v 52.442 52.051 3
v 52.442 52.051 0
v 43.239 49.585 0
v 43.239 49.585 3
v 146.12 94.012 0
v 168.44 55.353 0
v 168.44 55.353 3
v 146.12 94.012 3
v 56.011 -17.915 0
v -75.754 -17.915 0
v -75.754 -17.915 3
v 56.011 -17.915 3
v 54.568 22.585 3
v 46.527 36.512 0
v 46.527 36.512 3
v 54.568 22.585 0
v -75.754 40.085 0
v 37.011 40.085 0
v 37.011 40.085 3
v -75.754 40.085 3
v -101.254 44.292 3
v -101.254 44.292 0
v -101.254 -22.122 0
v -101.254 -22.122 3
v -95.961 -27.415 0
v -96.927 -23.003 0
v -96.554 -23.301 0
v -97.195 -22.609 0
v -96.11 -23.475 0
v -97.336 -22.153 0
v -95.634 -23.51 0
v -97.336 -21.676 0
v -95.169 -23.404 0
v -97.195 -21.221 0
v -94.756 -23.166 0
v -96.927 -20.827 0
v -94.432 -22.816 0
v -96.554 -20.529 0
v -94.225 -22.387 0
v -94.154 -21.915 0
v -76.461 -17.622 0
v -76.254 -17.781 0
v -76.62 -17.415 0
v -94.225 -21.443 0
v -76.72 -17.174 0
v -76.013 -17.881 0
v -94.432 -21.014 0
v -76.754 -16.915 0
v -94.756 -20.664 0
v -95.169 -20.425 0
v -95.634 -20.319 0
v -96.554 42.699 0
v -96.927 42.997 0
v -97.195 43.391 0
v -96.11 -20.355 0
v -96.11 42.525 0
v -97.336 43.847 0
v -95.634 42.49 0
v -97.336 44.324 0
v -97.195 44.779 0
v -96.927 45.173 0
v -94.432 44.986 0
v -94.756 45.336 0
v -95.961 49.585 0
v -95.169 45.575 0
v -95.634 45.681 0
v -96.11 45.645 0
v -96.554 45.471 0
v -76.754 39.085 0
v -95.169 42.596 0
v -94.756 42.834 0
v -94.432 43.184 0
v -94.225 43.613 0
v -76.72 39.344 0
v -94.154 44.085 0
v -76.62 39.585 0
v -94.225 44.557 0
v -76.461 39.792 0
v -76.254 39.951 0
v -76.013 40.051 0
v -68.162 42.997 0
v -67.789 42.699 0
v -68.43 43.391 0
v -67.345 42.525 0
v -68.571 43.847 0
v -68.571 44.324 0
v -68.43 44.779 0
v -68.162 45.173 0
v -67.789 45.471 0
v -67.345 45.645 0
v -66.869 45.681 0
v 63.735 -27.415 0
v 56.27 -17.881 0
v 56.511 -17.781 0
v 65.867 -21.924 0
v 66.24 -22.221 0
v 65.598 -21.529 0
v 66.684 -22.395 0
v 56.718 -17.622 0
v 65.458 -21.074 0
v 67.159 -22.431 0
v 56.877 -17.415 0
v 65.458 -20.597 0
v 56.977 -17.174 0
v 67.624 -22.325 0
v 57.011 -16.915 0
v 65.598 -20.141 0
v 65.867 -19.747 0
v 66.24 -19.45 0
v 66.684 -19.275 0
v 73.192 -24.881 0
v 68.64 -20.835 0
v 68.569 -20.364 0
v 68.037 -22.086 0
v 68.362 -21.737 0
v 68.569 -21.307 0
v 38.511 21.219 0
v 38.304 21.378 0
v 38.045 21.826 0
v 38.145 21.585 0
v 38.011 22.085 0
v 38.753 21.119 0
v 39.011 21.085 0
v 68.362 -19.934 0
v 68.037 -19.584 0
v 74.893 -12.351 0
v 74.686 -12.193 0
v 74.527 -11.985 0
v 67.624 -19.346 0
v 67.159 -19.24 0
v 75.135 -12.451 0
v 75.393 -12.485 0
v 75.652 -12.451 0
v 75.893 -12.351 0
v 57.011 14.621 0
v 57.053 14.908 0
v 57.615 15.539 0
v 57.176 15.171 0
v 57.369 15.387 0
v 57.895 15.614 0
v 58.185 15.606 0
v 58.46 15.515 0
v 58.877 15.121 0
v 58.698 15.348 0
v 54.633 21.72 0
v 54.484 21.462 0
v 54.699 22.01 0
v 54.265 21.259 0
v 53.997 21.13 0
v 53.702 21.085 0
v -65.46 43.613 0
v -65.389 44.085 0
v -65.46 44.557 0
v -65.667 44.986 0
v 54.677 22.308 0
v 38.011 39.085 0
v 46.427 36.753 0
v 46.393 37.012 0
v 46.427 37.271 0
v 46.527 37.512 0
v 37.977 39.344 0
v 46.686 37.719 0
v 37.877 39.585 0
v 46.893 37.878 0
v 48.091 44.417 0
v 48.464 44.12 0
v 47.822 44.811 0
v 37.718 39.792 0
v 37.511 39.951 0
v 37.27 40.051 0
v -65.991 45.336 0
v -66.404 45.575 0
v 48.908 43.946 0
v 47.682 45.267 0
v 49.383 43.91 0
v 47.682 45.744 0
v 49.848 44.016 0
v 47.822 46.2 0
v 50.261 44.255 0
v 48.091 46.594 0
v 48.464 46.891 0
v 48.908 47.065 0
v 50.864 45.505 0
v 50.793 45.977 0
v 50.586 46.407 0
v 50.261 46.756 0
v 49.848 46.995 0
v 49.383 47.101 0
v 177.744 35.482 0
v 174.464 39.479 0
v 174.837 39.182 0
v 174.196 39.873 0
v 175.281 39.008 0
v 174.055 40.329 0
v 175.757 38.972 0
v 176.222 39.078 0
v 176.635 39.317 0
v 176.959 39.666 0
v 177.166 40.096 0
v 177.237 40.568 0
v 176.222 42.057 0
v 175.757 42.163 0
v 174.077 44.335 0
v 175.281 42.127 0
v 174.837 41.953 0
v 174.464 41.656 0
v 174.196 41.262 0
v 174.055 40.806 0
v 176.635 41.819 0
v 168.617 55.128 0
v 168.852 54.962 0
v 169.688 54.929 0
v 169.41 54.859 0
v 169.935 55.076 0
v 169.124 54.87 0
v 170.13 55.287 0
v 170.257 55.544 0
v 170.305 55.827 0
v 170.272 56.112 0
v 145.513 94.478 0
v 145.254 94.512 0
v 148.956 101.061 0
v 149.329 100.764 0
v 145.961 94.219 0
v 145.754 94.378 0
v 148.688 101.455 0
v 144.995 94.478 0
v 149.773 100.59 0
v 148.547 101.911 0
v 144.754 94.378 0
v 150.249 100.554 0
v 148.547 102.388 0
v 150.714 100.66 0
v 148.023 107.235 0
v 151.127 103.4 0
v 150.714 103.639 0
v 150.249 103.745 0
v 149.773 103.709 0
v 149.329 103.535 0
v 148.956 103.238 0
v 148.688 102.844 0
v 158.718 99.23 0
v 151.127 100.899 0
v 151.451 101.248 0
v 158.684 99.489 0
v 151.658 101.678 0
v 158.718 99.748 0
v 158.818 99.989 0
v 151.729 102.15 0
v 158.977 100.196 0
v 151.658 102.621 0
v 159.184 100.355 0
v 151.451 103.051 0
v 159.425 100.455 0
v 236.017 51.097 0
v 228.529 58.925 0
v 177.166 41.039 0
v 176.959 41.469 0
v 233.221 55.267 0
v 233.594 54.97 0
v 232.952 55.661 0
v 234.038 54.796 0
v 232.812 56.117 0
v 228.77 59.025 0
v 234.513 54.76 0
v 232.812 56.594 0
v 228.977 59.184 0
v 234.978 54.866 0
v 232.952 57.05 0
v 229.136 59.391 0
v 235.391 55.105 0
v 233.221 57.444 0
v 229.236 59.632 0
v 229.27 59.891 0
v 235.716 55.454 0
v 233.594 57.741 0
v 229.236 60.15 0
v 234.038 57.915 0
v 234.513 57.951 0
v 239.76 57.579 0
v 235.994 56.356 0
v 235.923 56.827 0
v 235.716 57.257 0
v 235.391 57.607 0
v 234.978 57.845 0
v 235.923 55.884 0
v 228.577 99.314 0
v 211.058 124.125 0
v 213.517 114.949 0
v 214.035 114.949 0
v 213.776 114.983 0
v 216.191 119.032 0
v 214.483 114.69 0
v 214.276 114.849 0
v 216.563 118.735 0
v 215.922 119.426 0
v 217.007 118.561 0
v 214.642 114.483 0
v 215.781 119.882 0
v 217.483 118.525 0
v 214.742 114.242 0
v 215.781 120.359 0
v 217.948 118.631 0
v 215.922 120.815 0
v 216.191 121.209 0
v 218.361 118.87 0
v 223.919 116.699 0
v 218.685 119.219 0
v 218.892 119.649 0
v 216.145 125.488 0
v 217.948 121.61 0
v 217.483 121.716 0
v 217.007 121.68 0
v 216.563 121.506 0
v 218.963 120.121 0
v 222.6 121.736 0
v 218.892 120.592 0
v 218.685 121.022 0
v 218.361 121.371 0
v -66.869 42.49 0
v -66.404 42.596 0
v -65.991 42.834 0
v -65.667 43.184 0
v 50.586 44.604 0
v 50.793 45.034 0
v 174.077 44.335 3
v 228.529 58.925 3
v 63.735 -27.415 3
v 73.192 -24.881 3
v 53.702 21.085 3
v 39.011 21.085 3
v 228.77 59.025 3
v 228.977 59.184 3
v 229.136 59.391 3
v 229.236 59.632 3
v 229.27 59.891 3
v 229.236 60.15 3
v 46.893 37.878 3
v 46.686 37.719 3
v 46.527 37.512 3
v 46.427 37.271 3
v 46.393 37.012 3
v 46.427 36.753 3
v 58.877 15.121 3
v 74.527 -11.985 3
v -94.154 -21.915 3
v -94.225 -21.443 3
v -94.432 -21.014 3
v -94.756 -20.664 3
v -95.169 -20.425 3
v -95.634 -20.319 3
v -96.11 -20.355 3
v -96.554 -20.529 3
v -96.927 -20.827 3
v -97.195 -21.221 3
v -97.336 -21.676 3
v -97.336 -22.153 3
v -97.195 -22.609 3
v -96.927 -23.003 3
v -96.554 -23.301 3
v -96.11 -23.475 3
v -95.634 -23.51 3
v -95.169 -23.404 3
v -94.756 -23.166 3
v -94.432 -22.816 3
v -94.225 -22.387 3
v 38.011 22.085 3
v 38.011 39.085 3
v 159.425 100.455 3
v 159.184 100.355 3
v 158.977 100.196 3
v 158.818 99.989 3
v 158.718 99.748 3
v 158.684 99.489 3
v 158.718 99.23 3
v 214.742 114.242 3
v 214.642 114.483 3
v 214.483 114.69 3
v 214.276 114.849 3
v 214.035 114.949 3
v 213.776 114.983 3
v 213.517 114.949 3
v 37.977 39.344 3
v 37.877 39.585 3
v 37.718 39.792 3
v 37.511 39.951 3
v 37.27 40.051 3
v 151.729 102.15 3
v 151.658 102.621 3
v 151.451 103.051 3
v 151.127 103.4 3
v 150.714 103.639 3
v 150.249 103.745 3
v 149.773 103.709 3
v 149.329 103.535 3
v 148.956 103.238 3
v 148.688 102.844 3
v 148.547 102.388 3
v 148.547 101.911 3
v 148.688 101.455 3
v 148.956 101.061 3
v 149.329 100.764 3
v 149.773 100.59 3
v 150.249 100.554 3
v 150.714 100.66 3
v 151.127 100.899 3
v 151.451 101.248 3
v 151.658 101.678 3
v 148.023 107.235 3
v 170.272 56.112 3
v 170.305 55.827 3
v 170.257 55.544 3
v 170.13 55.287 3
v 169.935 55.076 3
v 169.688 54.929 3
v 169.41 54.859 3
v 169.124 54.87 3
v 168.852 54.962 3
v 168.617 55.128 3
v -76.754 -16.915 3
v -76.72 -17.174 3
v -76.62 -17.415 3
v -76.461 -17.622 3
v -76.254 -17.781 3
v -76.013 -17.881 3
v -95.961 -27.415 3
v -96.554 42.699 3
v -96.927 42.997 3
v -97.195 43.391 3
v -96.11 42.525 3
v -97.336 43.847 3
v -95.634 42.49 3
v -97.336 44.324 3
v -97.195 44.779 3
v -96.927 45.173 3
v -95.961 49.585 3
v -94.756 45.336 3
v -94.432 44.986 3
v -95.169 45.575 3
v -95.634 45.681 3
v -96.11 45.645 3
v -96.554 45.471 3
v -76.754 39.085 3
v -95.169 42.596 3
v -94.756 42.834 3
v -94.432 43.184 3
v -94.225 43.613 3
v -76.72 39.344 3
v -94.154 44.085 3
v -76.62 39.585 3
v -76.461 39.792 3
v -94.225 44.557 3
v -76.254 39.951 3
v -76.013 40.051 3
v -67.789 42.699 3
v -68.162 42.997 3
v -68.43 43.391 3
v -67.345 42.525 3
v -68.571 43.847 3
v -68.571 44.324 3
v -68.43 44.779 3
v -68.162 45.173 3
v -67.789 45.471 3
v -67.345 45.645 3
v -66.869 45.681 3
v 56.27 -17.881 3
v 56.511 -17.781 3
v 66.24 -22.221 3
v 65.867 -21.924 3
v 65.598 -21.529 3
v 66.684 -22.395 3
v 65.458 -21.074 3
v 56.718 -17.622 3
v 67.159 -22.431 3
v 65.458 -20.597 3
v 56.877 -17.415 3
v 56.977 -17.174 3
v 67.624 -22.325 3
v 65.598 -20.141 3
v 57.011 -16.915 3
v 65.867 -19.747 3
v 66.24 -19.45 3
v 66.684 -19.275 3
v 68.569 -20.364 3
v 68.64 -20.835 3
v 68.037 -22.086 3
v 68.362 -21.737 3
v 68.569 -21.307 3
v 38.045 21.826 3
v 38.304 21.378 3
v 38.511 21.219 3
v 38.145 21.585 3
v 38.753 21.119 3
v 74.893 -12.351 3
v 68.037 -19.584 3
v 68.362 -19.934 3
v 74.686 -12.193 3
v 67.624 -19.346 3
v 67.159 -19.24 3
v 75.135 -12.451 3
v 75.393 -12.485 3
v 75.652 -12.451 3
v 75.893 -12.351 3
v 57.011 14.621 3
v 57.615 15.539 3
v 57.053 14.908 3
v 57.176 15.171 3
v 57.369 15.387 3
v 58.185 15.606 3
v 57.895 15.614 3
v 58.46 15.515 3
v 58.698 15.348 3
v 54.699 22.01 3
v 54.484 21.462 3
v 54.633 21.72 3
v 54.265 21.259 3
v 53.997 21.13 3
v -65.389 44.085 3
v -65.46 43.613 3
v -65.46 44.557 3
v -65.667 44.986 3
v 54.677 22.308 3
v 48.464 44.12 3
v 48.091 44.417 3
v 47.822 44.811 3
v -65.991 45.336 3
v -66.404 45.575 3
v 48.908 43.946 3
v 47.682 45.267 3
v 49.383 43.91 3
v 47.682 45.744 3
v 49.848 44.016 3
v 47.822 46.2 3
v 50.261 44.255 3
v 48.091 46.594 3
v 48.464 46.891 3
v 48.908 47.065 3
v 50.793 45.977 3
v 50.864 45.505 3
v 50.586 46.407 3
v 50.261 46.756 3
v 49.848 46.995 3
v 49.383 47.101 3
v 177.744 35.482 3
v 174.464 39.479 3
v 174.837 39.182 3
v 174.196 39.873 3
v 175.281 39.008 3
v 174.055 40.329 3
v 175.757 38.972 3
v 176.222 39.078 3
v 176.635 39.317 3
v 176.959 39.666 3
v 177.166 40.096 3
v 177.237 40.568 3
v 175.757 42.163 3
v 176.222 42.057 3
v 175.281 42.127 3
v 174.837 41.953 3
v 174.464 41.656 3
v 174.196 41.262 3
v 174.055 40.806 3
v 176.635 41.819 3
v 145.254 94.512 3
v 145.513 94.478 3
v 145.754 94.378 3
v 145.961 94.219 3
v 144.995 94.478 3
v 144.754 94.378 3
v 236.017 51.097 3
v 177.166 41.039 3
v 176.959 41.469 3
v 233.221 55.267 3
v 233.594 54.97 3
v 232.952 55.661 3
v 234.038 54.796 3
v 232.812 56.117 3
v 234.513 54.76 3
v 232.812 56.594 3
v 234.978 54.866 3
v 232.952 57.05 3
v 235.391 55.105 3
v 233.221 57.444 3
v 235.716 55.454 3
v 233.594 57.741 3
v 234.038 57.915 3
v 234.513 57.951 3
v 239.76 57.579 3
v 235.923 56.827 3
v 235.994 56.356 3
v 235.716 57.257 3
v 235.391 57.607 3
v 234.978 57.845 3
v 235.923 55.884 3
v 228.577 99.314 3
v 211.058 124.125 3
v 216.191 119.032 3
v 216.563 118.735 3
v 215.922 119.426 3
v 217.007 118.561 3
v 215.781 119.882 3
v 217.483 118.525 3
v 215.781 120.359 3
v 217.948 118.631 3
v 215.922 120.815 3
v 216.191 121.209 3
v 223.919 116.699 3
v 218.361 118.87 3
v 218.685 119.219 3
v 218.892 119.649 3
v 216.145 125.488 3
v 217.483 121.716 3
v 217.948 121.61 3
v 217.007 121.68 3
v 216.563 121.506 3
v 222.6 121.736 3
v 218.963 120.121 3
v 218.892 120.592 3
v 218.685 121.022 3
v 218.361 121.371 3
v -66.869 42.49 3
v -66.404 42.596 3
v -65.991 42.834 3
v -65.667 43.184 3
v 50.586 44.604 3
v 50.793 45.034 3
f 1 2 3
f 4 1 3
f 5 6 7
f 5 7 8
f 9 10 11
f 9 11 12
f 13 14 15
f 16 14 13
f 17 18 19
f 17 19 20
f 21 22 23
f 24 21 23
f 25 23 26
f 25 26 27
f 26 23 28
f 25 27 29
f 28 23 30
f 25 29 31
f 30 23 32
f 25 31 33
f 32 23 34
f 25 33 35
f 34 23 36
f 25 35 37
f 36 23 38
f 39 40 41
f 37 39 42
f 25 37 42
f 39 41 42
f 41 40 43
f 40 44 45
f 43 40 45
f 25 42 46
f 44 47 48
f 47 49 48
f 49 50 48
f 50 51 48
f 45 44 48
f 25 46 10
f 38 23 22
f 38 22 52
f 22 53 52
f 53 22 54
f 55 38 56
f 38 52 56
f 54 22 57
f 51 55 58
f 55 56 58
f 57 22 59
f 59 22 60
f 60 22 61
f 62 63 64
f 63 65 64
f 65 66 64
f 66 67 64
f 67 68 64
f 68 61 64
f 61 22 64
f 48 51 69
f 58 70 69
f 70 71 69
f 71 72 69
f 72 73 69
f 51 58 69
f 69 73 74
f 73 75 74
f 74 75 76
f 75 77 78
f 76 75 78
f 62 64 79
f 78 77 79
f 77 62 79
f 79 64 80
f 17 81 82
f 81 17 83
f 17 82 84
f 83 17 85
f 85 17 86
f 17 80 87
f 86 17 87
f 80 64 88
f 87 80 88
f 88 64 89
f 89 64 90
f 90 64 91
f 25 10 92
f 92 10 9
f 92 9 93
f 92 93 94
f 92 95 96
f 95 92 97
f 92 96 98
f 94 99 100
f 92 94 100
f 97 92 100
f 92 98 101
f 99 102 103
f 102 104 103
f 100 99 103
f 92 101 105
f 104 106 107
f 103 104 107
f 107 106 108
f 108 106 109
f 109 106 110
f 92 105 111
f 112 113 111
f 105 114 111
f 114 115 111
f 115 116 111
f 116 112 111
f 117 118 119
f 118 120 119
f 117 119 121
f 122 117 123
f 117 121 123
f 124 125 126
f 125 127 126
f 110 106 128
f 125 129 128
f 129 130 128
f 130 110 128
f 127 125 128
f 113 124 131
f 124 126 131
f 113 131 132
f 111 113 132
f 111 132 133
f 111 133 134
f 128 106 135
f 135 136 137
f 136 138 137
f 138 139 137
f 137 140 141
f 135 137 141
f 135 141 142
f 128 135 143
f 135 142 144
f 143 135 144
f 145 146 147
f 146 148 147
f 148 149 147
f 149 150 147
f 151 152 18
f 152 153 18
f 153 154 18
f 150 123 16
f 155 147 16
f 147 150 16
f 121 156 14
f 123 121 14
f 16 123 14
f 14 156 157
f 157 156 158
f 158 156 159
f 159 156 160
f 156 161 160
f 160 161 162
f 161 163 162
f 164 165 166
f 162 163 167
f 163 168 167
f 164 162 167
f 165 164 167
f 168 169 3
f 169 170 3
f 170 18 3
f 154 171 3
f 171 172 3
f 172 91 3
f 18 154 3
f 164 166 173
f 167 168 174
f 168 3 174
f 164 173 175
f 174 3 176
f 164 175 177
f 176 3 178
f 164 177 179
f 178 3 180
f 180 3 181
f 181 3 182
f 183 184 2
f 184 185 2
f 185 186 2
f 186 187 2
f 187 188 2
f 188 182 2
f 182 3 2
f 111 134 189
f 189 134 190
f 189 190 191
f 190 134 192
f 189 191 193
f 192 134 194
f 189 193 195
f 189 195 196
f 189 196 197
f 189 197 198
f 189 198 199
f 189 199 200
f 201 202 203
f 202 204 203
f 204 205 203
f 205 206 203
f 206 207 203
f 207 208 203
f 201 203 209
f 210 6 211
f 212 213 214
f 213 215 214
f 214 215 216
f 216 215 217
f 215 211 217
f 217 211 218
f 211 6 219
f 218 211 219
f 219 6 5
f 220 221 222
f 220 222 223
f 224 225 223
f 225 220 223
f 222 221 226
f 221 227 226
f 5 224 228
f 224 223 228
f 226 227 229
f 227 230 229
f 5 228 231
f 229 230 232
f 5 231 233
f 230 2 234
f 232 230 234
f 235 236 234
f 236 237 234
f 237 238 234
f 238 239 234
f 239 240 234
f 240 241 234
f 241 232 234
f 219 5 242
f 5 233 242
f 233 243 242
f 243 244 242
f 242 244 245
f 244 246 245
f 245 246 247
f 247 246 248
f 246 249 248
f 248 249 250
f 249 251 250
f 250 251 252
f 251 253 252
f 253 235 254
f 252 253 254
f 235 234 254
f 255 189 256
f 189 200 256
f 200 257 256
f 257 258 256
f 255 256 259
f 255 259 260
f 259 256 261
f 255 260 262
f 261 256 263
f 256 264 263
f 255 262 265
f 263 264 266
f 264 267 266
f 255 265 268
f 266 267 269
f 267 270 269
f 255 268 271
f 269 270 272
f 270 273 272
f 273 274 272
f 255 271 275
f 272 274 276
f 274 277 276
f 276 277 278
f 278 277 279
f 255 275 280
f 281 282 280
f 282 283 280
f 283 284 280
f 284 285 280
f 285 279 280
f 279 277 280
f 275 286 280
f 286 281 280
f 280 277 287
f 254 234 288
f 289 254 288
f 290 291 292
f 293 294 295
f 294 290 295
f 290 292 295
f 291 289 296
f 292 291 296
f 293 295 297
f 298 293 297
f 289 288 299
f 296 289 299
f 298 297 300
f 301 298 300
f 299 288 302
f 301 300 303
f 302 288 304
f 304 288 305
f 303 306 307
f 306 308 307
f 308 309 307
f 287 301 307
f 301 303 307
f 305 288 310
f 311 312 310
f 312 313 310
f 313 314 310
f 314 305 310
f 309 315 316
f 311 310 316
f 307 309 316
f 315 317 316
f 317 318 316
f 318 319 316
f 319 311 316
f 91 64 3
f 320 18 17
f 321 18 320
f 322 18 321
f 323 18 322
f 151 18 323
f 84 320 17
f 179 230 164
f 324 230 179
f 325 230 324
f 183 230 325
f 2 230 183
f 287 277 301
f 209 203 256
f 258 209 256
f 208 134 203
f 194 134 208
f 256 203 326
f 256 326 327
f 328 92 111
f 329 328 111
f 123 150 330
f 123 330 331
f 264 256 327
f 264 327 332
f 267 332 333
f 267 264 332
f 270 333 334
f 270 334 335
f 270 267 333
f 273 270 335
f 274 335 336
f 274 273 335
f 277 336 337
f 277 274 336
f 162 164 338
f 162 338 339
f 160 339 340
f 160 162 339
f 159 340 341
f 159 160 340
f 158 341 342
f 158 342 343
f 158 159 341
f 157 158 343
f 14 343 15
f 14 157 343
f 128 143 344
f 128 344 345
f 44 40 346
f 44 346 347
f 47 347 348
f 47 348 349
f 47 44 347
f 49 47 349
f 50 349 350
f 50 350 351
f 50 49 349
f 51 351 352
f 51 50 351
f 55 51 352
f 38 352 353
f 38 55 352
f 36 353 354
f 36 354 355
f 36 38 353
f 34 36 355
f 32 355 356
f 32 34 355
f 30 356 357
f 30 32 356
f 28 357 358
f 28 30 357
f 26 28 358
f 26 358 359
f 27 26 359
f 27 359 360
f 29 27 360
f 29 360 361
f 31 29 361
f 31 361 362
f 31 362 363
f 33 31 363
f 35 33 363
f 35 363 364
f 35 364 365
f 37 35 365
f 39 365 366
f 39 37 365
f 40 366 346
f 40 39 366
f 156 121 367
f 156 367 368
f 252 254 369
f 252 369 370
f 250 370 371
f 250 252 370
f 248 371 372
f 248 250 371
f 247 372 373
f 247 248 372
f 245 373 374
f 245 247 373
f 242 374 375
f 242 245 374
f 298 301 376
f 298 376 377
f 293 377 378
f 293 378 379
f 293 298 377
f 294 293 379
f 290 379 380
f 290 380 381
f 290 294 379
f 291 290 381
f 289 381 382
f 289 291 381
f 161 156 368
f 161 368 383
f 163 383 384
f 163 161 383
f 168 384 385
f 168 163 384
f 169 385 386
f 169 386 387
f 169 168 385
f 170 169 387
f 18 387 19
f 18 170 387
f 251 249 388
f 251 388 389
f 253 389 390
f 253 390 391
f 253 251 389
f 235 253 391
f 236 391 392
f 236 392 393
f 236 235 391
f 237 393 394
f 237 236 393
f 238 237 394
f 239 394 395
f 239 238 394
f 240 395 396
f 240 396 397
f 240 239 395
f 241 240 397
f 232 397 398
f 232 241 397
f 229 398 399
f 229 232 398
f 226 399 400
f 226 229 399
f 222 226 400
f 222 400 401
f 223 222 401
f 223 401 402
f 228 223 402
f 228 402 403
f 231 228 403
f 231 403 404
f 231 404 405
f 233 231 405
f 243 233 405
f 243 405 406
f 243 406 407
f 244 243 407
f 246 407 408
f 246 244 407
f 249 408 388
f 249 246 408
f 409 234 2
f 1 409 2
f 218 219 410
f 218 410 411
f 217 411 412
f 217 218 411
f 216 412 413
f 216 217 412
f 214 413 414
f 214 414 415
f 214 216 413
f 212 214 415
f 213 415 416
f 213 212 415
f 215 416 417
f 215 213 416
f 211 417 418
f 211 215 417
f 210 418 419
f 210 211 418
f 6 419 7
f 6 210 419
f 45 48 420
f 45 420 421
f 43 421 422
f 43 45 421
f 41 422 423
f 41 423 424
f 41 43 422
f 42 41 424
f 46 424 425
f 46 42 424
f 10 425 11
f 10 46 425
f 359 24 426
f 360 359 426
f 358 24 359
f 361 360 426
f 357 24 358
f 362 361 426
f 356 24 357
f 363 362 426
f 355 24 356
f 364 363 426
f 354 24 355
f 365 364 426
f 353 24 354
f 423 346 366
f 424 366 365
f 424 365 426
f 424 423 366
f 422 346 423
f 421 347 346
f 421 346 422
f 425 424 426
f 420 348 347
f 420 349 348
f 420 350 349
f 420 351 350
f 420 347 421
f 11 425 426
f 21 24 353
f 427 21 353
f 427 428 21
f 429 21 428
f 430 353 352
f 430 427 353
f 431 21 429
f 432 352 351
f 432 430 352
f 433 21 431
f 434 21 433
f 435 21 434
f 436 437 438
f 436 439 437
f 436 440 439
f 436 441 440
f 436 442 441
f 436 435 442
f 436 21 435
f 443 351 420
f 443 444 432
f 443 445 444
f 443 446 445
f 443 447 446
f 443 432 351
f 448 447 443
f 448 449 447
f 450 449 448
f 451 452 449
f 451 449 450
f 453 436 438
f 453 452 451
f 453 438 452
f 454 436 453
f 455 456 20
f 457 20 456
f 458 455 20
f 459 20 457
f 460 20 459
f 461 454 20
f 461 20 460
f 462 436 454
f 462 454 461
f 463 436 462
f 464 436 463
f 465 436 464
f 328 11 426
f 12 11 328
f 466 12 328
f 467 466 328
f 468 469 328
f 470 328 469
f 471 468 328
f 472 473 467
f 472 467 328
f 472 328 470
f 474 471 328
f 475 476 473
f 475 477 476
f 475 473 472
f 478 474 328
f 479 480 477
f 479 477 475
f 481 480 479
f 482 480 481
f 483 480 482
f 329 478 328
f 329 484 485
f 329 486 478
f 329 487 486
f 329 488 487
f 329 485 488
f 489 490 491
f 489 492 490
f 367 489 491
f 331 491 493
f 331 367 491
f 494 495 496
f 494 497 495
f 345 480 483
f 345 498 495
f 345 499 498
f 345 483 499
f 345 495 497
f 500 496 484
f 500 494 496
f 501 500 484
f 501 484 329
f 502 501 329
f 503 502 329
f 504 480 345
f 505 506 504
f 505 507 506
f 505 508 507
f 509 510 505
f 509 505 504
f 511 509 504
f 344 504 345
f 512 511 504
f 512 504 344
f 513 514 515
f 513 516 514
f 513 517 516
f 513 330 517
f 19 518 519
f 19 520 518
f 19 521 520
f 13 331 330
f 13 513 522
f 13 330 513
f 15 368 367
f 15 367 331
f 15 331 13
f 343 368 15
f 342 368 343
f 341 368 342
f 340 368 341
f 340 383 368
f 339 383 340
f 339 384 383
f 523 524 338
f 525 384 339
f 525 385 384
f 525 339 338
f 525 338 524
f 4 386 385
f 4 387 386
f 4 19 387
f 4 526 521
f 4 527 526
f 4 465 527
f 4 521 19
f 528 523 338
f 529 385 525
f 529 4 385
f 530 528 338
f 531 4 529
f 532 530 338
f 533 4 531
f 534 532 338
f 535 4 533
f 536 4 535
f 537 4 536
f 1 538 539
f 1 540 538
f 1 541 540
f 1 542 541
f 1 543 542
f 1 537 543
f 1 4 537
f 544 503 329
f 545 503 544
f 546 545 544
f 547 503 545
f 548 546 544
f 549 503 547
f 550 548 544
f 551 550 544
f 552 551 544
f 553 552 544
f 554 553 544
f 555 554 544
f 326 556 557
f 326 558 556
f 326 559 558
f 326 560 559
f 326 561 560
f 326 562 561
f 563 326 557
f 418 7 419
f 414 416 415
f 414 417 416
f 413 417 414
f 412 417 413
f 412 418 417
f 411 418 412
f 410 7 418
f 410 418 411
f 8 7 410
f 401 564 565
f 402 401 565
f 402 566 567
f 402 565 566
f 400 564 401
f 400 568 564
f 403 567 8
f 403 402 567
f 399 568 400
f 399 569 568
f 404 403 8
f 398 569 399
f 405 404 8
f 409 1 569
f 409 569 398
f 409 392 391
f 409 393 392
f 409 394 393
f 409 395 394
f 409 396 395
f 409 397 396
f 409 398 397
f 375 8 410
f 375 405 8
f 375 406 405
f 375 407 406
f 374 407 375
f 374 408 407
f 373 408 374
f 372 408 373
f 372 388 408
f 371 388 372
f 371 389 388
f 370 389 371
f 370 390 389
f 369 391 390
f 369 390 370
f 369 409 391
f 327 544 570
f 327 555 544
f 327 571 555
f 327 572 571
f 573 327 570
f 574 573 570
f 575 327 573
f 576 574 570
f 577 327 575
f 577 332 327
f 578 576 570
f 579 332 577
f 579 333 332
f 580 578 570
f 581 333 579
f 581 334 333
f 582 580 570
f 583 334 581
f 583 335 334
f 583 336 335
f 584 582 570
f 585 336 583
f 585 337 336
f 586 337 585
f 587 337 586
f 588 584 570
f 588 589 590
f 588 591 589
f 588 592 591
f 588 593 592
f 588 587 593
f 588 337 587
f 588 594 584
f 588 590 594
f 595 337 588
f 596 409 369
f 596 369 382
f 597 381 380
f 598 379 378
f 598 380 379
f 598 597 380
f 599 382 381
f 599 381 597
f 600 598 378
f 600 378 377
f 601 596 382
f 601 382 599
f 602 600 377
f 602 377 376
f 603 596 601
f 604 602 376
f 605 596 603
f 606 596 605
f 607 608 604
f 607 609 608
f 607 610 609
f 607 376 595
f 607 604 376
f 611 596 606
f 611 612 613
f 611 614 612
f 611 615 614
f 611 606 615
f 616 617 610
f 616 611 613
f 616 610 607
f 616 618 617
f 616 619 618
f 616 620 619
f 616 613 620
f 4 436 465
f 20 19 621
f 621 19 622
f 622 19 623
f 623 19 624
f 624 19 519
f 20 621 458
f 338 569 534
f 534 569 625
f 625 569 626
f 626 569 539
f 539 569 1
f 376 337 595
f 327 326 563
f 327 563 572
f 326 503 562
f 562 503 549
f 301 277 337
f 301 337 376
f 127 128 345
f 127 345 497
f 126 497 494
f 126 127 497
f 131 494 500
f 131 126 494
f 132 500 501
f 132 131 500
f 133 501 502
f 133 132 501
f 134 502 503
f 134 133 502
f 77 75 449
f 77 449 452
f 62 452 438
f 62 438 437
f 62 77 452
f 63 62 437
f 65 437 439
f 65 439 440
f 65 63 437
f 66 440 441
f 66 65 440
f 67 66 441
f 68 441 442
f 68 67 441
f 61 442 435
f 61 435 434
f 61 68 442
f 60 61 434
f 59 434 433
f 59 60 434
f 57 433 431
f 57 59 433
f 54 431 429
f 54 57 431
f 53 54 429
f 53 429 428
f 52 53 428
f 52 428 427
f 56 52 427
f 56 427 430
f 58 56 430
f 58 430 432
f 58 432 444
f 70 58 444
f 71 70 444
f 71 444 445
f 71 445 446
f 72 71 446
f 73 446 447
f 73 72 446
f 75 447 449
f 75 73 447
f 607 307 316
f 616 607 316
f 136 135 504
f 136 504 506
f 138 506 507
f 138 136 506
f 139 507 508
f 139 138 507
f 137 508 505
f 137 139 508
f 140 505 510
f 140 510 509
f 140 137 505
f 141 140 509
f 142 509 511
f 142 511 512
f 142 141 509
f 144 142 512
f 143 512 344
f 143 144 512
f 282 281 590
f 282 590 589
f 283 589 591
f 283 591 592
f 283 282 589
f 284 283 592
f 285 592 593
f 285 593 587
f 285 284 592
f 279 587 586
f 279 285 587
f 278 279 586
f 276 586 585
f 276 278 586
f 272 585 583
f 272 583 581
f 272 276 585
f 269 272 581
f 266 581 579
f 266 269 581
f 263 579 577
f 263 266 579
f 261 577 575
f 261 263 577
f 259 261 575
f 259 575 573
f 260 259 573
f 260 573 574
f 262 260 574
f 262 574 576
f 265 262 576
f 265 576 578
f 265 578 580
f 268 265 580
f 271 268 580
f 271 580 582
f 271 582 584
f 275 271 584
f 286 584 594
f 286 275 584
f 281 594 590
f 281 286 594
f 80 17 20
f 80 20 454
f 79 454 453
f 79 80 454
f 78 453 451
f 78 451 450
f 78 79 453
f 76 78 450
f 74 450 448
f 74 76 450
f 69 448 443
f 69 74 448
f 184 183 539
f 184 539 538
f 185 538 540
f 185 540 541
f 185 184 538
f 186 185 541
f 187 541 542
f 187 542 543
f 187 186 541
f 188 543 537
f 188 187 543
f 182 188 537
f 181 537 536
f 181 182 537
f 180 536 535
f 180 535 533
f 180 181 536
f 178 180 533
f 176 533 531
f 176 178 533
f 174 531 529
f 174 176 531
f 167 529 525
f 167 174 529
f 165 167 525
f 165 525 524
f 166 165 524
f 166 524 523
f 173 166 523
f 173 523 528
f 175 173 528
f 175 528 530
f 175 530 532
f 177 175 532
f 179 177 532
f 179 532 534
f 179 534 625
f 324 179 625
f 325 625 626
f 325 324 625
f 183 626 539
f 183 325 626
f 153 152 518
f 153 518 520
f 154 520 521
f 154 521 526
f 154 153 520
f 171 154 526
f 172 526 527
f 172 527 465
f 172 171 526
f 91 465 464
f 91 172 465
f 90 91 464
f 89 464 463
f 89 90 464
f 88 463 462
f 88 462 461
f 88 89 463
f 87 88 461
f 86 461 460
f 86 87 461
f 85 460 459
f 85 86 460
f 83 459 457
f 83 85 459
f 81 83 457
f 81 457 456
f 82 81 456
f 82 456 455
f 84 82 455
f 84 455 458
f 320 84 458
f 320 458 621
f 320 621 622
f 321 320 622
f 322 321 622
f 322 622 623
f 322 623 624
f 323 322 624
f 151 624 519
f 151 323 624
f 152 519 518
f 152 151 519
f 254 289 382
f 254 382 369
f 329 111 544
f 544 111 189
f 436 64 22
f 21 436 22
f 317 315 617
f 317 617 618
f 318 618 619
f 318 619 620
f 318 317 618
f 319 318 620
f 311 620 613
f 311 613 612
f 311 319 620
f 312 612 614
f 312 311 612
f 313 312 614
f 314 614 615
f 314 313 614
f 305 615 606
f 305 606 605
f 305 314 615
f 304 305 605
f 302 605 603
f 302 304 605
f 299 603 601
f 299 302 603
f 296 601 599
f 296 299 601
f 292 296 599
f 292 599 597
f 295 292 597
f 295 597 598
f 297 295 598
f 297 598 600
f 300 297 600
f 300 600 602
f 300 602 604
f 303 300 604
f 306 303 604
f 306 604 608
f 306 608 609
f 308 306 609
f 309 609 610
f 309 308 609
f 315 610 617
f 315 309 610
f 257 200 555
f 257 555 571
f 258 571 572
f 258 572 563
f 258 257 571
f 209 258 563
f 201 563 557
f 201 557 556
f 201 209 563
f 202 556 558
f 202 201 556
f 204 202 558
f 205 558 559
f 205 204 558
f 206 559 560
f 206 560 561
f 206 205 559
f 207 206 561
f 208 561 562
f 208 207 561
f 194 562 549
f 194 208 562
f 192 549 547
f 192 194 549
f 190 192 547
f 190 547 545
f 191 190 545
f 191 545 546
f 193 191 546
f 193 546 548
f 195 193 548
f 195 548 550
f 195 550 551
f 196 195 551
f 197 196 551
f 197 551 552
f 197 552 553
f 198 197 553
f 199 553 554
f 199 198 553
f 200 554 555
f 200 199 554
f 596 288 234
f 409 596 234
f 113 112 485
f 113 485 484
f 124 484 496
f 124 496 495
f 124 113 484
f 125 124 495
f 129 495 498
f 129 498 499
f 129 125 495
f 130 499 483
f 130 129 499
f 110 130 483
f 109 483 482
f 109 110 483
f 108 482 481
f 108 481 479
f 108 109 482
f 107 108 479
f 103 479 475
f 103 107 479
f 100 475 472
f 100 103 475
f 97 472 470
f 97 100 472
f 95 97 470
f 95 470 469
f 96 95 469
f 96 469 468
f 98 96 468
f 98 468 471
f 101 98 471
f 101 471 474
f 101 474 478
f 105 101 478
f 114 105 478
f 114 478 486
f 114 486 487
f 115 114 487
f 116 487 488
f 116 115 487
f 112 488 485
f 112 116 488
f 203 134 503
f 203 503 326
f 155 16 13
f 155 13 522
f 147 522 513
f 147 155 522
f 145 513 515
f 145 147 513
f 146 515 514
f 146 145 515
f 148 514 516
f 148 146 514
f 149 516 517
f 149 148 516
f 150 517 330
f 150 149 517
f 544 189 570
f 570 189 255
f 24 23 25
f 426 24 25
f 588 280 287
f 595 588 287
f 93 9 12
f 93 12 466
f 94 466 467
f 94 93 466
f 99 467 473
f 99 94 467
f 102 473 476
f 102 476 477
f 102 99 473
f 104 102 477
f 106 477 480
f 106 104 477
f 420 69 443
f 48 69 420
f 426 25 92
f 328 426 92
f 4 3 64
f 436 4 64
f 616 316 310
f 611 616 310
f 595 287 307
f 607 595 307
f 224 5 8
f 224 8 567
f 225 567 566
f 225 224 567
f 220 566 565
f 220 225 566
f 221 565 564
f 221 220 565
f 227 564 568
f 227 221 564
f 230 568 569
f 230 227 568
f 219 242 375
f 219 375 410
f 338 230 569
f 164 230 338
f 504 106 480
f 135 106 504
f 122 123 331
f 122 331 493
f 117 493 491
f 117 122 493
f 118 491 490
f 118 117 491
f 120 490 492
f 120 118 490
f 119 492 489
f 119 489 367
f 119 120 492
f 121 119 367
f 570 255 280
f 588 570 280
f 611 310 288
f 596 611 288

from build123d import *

# Parameters (mm, degrees)
ESQUISSE1_R        = 1.6
BOSS_EXTRU_1_DEPTH = 3


with BuildPart() as part:
    # Esquisse1 → Boss.-Extru.1 (new body)
    with BuildSketch(Plane.XY):
        Polygon((-75.988646329, 49.585106383), (-95.960869343, 49.585106383), (-101.253762562, 44.292213164), (-101.253762562, 35.79522772), (-101.253762562, -22.122000398), (-95.960869343, -27.414893617), (63.734552111, -27.414893617), (73.191845678, -24.880819443), (177.743787613, 35.482272378), (236.017194438, 51.096584676), (239.759835125, 57.579028501), (228.577013006, 99.31388882), (223.918643626, 116.699160027), (222.600104344, 121.736116557), (216.144691957, 125.488029577), (211.058449045, 124.125174896), (148.022896982, 107.234849626), (52.44172146, 52.051032209), (43.238760989, 49.585106383), align=None)
        with Locations((-95.753762562, 44.085106383)):
            Circle(ESQUISSE1_R, mode=Mode.SUBTRACT)
        with Locations((-66.988646329, 44.085106383)):
            Circle(ESQUISSE1_R, mode=Mode.SUBTRACT)
        with Locations((-95.753762562, -21.914893617)):
            Circle(ESQUISSE1_R, mode=Mode.SUBTRACT)
        with Locations((67.039694146, -20.835264486)):
            Circle(ESQUISSE1_R, mode=Mode.SUBTRACT)
        with Locations((49.263745973, 45.505477252)):
            Circle(ESQUISSE1_R, mode=Mode.SUBTRACT)
        with Locations((150.12930694, 102.149526137)):
            Circle(ESQUISSE1_R, mode=Mode.SUBTRACT)
        with Locations((217.363403759, 120.120565138)):
            Circle(ESQUISSE1_R, mode=Mode.SUBTRACT)
        with Locations((234.393639901, 56.355573542)):
            Circle(ESQUISSE1_R, mode=Mode.SUBTRACT)
        with Locations((175.637377655, 40.567595866)):
            Circle(ESQUISSE1_R, mode=Mode.SUBTRACT)
        with BuildLine():
            Line((-76.753762562, 39.085106383), (-76.753762562, -16.914893617))
            ThreePointArc((-76.753762562, -16.914893617), (-76.460869343, -17.622000398), (-75.753762562, -17.914893617))
            Line((-75.753762562, -17.914893617), (56.011353671, -17.914893617))
            ThreePointArc((56.011353671, -17.914893617), (56.718460453, -17.622000398), (57.011353671, -16.914893617))
            Line((57.011353671, -16.914893617), (57.011353671, 14.621004768))
            ThreePointArc((57.011353671, 14.621004768), (57.752534626, 15.586930594), (58.877379075, 15.121004768))
            Line((58.877379075, 15.121004768), (74.527293708, -11.98544251))
            ThreePointArc((74.527293708, -11.98544251), (75.134500067, -12.451368337), (75.893319112, -12.351467914))
            Line((75.893319112, -12.351467914), (174.076924484, 44.334863077))
            Line((174.076924484, 44.334863077), (228.528734589, 58.925181621))
            ThreePointArc((228.528734589, 58.925181621), (229.135940948, 59.391107448), (229.235841371, 60.149926493))
            Line((229.235841371, 60.149926493), (214.741974845, 114.241772765))
            ThreePointArc((214.741974845, 114.241772765), (214.276049019, 114.848979124), (213.517229973, 114.948879546))
            Line((213.517229973, 114.948879546), (159.425383701, 100.45501302))
            ThreePointArc((159.425383701, 100.45501302), (158.818177343, 99.989087194), (158.71827692, 99.230268149))
            Line((158.71827692, 99.230268149), (170.271736655, 56.112169417))
            ThreePointArc((170.271736655, 56.112169417), (169.688494261, 54.929470839), (168.439785425, 55.353350371))
            Line((168.439785425, 55.353350371), (146.120215143, 94.011980101))
            ThreePointArc((146.120215143, 94.011980101), (145.513008785, 94.477905928), (144.75418974, 94.378005505))
            Line((144.75418974, 94.378005505), (46.893319112, 37.878005505))
            ThreePointArc((46.893319112, 37.878005505), (46.427393286, 37.270799147), (46.527293708, 36.511980101))
            Line((46.527293708, 36.511980101), (54.567977999, 22.585106383))
            ThreePointArc((54.567977999, 22.585106383), (54.567977999, 21.585106383), (53.701952595, 21.085106383))
            Line((53.701952595, 21.085106383), (39.011353671, 21.085106383))
            ThreePointArc((39.011353671, 21.085106383), (38.30424689, 21.377999602), (38.011353671, 22.085106383))
            Line((38.011353671, 22.085106383), (38.011353671, 39.085106383))
            ThreePointArc((38.011353671, 39.085106383), (37.718460453, 39.792213164), (37.011353671, 40.085106383))
            Line((37.011353671, 40.085106383), (-75.753762562, 40.085106383))
            ThreePointArc((-75.753762562, 40.085106383), (-76.460869343, 39.792213164), (-76.753762562, 39.085106383))
        make_face(mode=Mode.SUBTRACT)
    extrude(amount=BOSS_EXTRU_1_DEPTH)


solid = part.part
